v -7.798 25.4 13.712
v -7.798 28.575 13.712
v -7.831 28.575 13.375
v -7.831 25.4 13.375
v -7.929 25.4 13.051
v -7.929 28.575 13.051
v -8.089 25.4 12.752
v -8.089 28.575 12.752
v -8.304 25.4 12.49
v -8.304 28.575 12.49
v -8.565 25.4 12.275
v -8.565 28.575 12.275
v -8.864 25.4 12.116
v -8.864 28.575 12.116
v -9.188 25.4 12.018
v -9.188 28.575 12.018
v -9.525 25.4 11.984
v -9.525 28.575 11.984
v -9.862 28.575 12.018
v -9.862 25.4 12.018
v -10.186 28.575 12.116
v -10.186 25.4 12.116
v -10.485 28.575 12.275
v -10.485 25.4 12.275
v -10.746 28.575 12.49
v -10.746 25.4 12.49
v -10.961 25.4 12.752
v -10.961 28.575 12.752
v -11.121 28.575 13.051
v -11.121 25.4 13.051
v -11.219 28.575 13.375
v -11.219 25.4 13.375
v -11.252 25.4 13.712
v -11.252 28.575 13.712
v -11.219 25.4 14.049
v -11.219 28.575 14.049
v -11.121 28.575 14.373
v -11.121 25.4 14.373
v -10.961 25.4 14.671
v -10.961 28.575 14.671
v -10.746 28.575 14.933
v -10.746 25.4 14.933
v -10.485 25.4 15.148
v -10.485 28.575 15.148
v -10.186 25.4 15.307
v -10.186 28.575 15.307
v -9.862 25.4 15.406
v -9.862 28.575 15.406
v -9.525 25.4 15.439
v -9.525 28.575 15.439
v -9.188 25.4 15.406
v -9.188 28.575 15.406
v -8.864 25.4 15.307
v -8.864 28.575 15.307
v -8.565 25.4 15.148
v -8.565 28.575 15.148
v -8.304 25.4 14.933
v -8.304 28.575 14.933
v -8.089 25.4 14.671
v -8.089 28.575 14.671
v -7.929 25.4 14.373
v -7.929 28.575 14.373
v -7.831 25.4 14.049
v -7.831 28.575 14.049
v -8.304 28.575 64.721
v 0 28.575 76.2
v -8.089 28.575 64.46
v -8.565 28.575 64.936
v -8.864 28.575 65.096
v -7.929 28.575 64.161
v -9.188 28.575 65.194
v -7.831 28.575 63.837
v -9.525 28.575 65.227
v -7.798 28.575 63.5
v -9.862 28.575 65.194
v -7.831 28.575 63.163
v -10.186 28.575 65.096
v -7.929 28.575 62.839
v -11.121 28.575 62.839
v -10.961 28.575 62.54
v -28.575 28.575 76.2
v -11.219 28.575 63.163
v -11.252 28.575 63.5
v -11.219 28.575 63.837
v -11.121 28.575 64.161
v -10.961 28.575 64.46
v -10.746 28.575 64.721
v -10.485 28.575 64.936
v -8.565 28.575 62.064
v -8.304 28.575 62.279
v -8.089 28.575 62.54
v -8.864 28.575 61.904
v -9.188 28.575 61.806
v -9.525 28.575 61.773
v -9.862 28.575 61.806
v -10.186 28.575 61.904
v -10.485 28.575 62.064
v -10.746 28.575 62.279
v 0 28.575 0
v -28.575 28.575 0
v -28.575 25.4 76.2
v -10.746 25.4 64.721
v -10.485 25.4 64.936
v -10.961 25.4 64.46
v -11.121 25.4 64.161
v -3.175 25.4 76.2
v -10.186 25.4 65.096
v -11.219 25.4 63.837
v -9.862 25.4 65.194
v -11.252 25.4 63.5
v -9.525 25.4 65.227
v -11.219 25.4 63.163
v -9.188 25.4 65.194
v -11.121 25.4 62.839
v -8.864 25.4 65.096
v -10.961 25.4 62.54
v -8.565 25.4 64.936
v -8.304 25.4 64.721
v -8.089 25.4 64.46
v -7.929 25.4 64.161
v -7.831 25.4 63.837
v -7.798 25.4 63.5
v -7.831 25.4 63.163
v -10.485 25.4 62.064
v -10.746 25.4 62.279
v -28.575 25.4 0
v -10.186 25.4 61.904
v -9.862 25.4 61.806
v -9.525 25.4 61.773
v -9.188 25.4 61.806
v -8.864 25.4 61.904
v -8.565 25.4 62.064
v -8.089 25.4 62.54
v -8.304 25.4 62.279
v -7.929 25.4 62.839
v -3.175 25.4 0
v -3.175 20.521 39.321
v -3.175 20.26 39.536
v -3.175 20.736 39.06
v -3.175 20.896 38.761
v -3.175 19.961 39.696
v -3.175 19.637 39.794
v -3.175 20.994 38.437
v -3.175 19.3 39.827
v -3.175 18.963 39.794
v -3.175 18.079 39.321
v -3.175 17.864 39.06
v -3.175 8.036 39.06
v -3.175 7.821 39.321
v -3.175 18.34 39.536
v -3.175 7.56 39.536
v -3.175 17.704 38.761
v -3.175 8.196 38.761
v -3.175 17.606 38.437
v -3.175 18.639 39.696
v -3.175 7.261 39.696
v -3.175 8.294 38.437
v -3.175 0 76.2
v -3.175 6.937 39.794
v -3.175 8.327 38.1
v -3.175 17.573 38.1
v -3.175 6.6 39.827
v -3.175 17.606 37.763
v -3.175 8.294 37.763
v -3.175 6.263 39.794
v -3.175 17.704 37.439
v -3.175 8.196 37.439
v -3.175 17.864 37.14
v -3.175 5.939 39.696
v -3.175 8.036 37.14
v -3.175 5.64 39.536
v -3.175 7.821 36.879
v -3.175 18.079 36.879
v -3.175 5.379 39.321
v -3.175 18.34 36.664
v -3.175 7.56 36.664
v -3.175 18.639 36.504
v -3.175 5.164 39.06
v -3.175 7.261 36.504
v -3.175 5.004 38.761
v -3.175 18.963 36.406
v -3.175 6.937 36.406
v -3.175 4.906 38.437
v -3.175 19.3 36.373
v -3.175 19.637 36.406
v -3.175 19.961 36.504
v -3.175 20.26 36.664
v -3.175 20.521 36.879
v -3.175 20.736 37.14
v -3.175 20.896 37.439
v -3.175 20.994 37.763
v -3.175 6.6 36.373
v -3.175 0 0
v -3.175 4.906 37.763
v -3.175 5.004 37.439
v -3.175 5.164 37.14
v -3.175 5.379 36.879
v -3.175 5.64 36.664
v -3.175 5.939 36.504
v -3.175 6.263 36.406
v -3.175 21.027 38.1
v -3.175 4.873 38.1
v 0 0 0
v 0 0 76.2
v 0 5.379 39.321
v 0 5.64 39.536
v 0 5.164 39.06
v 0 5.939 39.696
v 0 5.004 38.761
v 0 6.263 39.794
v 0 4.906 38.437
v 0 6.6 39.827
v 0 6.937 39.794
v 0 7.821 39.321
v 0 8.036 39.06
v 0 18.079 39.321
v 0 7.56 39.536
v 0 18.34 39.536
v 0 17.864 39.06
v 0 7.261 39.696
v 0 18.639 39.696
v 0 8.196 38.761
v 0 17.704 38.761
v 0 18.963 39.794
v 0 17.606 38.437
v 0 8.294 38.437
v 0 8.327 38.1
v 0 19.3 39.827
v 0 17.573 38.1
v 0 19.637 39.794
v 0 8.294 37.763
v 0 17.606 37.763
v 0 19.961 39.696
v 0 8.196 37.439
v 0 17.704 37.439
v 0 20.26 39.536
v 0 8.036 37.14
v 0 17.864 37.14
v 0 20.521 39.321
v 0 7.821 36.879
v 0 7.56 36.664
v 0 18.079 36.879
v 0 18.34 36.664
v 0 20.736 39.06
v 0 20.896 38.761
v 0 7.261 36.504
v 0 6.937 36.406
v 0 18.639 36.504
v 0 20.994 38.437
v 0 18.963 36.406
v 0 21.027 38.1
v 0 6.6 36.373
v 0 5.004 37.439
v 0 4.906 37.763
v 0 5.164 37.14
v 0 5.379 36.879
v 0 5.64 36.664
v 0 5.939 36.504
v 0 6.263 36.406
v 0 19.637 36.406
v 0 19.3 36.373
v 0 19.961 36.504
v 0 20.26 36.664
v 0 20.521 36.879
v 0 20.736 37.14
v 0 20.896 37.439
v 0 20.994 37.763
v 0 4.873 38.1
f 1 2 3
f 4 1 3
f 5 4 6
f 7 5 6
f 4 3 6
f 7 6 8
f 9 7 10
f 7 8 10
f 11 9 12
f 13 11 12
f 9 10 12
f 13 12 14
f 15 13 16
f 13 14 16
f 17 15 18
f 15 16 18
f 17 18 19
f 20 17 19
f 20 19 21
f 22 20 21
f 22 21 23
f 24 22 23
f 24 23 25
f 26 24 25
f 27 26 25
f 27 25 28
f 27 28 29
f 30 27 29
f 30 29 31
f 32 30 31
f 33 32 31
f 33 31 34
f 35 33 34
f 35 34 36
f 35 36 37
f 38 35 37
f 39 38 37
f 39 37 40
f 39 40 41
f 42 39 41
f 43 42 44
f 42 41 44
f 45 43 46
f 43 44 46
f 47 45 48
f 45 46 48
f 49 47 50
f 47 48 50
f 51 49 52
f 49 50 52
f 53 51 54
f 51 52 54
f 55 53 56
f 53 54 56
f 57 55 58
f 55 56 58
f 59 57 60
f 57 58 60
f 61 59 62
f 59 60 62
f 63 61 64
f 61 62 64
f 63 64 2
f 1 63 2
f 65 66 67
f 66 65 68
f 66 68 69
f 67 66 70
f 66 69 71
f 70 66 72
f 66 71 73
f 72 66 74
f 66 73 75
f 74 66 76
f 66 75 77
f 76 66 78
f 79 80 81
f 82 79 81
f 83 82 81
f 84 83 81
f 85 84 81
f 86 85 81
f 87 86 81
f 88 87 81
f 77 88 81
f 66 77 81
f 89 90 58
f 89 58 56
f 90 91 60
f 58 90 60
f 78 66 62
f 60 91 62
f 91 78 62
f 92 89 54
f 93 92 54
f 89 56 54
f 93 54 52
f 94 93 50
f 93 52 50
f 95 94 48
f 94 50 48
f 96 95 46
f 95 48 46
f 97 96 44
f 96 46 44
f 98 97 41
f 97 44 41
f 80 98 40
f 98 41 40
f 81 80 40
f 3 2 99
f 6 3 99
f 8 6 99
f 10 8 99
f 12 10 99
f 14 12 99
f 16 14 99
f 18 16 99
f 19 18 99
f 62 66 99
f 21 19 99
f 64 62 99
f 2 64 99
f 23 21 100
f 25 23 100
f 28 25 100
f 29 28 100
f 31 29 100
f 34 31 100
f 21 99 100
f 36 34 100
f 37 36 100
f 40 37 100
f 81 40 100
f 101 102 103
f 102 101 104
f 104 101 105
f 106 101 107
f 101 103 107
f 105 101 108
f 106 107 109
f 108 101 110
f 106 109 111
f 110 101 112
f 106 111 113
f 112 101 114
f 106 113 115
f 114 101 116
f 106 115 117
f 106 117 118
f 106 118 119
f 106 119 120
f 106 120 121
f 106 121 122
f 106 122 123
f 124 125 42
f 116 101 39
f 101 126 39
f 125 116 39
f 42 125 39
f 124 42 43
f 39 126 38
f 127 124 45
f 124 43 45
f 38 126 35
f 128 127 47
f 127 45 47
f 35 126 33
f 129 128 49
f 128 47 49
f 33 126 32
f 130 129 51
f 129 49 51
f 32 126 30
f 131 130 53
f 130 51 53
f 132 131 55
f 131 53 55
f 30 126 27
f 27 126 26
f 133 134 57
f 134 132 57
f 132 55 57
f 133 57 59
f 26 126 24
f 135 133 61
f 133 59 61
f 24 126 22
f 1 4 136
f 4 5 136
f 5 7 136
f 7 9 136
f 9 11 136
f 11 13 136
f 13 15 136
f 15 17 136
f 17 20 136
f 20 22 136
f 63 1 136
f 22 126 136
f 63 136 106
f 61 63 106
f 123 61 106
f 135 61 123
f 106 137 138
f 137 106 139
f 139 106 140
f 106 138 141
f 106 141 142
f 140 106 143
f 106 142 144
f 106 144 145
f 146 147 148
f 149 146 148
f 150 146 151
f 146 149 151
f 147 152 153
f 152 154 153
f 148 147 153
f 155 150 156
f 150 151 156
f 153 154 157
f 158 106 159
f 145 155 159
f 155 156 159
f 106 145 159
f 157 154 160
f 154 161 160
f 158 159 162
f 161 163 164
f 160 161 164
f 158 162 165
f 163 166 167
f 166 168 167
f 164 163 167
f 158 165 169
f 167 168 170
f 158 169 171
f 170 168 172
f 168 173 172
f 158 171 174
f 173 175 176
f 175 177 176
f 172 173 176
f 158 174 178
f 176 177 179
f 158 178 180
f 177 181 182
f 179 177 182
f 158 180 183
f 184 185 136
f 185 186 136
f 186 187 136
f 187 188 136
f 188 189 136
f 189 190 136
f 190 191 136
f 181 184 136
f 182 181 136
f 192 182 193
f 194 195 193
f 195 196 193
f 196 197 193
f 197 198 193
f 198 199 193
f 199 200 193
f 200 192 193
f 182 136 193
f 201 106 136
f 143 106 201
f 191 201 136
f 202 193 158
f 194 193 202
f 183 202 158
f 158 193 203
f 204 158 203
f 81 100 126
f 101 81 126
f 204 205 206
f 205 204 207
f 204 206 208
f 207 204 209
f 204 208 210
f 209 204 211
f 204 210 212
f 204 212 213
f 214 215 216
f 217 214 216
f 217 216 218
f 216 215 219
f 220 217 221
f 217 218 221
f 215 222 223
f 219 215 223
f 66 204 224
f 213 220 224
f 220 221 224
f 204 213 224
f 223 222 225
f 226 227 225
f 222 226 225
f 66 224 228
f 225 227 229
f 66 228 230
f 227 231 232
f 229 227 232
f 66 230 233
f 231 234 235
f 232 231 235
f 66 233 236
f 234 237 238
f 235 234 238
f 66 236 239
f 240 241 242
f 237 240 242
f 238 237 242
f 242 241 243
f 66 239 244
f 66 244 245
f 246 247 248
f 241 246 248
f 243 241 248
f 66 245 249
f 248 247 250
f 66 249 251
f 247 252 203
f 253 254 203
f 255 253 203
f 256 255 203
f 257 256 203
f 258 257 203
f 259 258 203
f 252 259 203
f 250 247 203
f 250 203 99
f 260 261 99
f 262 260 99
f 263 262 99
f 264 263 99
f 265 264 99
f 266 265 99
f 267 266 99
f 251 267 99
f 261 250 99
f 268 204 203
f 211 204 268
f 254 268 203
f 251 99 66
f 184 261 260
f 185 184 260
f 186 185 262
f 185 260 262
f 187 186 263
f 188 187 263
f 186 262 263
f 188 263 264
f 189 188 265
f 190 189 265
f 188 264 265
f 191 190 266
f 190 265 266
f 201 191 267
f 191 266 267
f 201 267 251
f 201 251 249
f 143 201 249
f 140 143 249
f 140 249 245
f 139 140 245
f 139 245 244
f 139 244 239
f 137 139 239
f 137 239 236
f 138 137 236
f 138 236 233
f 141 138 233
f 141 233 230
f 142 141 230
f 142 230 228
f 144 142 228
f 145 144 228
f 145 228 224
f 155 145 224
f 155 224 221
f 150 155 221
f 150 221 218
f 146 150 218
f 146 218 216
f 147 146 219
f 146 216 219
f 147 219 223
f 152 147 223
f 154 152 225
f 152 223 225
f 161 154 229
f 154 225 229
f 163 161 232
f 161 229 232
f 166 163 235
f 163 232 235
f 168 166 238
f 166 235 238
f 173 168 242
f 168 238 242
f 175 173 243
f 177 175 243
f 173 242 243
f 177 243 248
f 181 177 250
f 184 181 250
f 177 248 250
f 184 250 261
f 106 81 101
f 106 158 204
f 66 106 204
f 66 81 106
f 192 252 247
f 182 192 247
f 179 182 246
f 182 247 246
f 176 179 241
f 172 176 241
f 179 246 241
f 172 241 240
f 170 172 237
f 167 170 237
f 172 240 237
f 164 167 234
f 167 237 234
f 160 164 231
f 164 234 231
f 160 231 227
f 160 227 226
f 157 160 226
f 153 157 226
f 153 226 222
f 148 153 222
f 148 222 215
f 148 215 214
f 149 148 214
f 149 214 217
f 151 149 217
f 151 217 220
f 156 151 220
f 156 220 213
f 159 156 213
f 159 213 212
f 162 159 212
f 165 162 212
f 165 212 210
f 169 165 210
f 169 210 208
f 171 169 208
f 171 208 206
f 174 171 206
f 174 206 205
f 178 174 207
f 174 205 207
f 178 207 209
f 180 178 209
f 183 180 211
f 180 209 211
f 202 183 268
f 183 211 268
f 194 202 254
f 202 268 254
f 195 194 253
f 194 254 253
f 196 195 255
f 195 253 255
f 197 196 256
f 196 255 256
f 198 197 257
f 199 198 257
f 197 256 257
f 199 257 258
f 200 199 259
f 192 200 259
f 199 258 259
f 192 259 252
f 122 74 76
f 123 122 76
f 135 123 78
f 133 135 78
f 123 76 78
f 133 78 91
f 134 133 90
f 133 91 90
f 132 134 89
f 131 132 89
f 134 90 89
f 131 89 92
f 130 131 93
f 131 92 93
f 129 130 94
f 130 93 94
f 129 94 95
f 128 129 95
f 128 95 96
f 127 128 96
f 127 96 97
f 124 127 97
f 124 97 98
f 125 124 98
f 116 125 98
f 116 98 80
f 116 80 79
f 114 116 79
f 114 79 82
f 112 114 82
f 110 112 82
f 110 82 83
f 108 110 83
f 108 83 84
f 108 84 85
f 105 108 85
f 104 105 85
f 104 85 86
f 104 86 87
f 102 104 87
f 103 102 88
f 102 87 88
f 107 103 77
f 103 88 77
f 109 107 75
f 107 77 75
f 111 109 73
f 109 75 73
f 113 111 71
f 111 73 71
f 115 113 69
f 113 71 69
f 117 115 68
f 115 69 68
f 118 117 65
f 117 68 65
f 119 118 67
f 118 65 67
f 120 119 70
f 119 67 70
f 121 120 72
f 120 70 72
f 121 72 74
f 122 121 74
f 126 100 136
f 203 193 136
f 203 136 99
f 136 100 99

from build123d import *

# Parameters (mm, degrees)
BOSS_EXTRUDE1_DEPTH           = 76.2
TAP_DRILL_FOR_8_36_TAP1_D     = 3.4544
TAP_DRILL_FOR_8_36_TAP2_D     = 3.4544
TAP_DRILL_FOR_8_36_TAP2_DEPTH = 3.175


with BuildPart() as part:
    # Sketch1 → Boss-Extrude1 (new body)
    with BuildSketch(Plane.XY):
        Polygon((0, 0), (0, 28.575), (-28.575, 28.575), (-28.575, 25.4), (-3.175, 25.4), (-3.175, 0), align=None)
    extrude(amount=BOSS_EXTRUDE1_DEPTH)

    # Tap Drill for #8-36 Tap1 (through all)
    with Locations(Plane.ZY.offset(3.175)):
        with Locations((38.1, 6.6), (38.1, 19.3)):
            Hole(TAP_DRILL_FOR_8_36_TAP1_D / 2)

    # Tap Drill for #8-36 Tap2
    with Locations(Plane(origin=(0, 25.4, 0), x_dir=(-1, 0, 0), z_dir=(0, -1, 0))):
        with Locations((9.525, -63.5), (-28.575, -63.5), (9.525, -13.711593905), (-28.575, -13.711593905)):
            Hole(TAP_DRILL_FOR_8_36_TAP2_D / 2, depth=TAP_DRILL_FOR_8_36_TAP2_DEPTH)


solid = part.part
